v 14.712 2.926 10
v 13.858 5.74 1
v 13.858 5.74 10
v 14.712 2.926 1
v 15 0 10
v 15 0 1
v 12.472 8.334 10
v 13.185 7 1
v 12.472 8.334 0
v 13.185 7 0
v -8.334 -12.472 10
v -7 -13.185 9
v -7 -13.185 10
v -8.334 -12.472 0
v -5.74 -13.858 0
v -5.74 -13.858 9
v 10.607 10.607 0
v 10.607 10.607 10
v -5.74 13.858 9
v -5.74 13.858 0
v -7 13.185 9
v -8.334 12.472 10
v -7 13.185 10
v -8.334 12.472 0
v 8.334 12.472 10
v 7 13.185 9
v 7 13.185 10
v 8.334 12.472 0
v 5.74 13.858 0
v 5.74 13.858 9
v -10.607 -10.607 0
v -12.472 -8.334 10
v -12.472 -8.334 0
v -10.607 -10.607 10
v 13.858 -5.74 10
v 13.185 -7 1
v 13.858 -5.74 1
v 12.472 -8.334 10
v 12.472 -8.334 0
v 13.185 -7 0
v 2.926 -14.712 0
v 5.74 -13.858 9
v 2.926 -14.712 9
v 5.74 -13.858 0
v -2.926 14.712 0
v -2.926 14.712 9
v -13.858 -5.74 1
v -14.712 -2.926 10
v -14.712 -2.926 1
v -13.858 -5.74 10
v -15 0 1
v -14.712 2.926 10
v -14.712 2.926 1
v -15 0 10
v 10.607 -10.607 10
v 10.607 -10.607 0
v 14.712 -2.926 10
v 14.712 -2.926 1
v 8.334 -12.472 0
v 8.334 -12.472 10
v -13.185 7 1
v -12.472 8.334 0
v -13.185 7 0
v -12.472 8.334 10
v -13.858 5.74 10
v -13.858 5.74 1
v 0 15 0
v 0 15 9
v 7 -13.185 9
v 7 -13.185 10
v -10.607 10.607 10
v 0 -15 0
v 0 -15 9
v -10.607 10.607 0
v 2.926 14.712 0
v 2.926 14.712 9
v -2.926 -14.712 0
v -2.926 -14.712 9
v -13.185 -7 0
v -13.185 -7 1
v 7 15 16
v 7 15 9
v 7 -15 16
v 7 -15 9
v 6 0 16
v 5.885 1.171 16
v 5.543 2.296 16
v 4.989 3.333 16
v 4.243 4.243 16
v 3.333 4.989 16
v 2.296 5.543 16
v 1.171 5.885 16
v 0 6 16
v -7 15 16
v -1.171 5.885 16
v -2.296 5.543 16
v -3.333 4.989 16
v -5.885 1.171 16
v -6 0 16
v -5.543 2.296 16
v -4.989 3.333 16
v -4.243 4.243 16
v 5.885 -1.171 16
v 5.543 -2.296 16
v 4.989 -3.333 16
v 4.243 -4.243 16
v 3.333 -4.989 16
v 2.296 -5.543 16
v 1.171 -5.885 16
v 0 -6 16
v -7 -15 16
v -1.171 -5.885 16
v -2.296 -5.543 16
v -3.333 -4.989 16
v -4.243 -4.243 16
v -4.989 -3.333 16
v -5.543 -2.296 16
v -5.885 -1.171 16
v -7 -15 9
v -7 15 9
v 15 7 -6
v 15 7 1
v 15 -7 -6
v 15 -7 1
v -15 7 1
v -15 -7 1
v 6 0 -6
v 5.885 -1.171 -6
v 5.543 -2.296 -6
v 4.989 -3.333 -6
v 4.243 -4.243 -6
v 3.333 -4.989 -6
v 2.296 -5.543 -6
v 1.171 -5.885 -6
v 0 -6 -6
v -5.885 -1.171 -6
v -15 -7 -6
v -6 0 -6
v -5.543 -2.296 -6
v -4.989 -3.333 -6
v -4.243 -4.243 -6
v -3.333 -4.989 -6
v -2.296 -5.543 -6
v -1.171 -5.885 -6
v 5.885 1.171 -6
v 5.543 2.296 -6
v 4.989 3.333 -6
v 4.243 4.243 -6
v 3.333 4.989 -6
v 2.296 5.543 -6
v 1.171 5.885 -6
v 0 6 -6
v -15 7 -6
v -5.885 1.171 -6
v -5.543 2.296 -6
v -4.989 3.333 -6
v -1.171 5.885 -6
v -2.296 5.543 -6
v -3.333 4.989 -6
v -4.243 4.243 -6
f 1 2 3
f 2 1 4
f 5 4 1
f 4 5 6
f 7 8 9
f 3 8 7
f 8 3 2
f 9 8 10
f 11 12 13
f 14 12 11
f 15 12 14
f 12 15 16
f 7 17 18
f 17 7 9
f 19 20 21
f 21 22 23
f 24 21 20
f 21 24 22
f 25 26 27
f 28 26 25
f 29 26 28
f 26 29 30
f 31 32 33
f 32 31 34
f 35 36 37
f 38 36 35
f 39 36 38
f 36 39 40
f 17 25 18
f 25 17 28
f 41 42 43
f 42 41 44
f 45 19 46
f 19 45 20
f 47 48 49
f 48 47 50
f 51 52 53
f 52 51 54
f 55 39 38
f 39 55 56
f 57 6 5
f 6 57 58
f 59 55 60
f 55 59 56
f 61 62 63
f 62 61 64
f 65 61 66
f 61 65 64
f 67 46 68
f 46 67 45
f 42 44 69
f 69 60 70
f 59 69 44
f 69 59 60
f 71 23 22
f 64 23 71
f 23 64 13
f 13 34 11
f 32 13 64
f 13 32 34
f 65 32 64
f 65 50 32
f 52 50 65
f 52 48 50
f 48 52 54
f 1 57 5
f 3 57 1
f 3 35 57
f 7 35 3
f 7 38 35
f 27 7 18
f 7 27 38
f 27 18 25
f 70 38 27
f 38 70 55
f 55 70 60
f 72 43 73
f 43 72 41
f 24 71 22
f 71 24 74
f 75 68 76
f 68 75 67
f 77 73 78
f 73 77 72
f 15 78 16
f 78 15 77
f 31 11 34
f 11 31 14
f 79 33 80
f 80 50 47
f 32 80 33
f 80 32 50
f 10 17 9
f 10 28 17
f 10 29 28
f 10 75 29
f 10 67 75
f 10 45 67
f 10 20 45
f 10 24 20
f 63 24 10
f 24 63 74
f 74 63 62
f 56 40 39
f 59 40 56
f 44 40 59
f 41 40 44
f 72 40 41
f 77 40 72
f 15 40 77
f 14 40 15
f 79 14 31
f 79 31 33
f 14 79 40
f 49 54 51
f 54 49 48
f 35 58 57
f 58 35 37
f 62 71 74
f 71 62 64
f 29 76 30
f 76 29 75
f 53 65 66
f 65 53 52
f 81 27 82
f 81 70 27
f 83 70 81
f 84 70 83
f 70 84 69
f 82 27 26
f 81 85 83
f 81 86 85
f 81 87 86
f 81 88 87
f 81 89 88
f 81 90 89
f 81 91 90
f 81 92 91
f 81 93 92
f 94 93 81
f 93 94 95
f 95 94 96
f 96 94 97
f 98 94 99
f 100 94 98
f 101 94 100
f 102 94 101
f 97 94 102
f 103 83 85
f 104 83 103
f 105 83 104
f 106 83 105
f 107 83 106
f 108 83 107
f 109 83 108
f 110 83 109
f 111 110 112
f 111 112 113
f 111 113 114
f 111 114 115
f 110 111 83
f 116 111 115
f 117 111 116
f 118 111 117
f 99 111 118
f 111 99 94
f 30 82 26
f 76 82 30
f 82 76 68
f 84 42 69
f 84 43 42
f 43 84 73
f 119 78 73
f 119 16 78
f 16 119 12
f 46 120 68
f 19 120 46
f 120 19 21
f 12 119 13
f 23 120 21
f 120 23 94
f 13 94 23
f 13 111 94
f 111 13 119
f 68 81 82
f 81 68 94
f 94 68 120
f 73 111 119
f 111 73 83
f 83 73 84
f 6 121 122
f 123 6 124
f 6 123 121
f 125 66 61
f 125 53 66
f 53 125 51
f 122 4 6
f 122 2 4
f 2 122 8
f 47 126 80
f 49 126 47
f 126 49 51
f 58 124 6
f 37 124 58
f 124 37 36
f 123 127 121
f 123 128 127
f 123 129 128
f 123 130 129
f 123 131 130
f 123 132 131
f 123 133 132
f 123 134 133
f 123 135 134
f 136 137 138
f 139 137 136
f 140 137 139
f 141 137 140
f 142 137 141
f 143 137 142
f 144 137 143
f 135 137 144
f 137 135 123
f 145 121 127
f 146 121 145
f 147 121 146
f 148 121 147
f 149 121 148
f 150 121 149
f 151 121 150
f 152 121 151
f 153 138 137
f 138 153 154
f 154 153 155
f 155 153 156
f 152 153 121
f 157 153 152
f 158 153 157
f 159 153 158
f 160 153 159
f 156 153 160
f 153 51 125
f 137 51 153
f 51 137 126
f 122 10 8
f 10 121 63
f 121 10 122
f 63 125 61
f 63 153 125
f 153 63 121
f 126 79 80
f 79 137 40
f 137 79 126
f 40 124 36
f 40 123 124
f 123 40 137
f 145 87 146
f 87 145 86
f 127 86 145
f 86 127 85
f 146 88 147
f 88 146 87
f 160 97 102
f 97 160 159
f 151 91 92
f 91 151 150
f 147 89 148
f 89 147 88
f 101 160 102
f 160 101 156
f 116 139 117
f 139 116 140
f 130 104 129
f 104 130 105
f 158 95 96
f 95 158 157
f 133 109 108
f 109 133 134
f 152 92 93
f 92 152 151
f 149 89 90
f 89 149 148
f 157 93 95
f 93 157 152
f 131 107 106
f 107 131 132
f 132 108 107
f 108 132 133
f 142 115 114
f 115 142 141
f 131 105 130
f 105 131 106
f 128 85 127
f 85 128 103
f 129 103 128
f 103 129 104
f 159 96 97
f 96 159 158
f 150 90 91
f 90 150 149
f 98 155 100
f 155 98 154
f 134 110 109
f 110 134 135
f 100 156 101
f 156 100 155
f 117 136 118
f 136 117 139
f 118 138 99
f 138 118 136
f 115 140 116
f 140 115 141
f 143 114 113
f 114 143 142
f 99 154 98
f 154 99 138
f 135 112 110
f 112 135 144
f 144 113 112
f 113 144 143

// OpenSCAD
$fn = 32;

// ----------------------------------------------------------------------
// Oldham coupling disc: 30 x 22 mm
// ----------------------------------------------------------------------

// --- parameters (mm) ---
disc_d = 30;              // disc diameter
disc_t = 10;              // disc thickness
tongue_w = 14;            // tongue width
tongue_h = 6;             // tongue height
bore_d = 12;              // centre lightening bore

module disc() {
  cylinder(h = disc_t, d = disc_d);
  /* tongue on the top face, sunk 1 mm into the disc */
  translate([-tongue_w / 2, -disc_d / 2, disc_t - 1]) cube([tongue_w, disc_d, tongue_h + 1]);
  /* slot wall on the bottom face, 90 degrees turned */
  translate([-disc_d / 2, -tongue_w / 2, -tongue_h]) cube([disc_d, tongue_w, tongue_h + 1]);
}

difference() {
  disc();
  translate([0, 0, -tongue_h - 1]) cylinder(h = disc_t + 2 * tongue_h + 2, d = bore_d);
}
